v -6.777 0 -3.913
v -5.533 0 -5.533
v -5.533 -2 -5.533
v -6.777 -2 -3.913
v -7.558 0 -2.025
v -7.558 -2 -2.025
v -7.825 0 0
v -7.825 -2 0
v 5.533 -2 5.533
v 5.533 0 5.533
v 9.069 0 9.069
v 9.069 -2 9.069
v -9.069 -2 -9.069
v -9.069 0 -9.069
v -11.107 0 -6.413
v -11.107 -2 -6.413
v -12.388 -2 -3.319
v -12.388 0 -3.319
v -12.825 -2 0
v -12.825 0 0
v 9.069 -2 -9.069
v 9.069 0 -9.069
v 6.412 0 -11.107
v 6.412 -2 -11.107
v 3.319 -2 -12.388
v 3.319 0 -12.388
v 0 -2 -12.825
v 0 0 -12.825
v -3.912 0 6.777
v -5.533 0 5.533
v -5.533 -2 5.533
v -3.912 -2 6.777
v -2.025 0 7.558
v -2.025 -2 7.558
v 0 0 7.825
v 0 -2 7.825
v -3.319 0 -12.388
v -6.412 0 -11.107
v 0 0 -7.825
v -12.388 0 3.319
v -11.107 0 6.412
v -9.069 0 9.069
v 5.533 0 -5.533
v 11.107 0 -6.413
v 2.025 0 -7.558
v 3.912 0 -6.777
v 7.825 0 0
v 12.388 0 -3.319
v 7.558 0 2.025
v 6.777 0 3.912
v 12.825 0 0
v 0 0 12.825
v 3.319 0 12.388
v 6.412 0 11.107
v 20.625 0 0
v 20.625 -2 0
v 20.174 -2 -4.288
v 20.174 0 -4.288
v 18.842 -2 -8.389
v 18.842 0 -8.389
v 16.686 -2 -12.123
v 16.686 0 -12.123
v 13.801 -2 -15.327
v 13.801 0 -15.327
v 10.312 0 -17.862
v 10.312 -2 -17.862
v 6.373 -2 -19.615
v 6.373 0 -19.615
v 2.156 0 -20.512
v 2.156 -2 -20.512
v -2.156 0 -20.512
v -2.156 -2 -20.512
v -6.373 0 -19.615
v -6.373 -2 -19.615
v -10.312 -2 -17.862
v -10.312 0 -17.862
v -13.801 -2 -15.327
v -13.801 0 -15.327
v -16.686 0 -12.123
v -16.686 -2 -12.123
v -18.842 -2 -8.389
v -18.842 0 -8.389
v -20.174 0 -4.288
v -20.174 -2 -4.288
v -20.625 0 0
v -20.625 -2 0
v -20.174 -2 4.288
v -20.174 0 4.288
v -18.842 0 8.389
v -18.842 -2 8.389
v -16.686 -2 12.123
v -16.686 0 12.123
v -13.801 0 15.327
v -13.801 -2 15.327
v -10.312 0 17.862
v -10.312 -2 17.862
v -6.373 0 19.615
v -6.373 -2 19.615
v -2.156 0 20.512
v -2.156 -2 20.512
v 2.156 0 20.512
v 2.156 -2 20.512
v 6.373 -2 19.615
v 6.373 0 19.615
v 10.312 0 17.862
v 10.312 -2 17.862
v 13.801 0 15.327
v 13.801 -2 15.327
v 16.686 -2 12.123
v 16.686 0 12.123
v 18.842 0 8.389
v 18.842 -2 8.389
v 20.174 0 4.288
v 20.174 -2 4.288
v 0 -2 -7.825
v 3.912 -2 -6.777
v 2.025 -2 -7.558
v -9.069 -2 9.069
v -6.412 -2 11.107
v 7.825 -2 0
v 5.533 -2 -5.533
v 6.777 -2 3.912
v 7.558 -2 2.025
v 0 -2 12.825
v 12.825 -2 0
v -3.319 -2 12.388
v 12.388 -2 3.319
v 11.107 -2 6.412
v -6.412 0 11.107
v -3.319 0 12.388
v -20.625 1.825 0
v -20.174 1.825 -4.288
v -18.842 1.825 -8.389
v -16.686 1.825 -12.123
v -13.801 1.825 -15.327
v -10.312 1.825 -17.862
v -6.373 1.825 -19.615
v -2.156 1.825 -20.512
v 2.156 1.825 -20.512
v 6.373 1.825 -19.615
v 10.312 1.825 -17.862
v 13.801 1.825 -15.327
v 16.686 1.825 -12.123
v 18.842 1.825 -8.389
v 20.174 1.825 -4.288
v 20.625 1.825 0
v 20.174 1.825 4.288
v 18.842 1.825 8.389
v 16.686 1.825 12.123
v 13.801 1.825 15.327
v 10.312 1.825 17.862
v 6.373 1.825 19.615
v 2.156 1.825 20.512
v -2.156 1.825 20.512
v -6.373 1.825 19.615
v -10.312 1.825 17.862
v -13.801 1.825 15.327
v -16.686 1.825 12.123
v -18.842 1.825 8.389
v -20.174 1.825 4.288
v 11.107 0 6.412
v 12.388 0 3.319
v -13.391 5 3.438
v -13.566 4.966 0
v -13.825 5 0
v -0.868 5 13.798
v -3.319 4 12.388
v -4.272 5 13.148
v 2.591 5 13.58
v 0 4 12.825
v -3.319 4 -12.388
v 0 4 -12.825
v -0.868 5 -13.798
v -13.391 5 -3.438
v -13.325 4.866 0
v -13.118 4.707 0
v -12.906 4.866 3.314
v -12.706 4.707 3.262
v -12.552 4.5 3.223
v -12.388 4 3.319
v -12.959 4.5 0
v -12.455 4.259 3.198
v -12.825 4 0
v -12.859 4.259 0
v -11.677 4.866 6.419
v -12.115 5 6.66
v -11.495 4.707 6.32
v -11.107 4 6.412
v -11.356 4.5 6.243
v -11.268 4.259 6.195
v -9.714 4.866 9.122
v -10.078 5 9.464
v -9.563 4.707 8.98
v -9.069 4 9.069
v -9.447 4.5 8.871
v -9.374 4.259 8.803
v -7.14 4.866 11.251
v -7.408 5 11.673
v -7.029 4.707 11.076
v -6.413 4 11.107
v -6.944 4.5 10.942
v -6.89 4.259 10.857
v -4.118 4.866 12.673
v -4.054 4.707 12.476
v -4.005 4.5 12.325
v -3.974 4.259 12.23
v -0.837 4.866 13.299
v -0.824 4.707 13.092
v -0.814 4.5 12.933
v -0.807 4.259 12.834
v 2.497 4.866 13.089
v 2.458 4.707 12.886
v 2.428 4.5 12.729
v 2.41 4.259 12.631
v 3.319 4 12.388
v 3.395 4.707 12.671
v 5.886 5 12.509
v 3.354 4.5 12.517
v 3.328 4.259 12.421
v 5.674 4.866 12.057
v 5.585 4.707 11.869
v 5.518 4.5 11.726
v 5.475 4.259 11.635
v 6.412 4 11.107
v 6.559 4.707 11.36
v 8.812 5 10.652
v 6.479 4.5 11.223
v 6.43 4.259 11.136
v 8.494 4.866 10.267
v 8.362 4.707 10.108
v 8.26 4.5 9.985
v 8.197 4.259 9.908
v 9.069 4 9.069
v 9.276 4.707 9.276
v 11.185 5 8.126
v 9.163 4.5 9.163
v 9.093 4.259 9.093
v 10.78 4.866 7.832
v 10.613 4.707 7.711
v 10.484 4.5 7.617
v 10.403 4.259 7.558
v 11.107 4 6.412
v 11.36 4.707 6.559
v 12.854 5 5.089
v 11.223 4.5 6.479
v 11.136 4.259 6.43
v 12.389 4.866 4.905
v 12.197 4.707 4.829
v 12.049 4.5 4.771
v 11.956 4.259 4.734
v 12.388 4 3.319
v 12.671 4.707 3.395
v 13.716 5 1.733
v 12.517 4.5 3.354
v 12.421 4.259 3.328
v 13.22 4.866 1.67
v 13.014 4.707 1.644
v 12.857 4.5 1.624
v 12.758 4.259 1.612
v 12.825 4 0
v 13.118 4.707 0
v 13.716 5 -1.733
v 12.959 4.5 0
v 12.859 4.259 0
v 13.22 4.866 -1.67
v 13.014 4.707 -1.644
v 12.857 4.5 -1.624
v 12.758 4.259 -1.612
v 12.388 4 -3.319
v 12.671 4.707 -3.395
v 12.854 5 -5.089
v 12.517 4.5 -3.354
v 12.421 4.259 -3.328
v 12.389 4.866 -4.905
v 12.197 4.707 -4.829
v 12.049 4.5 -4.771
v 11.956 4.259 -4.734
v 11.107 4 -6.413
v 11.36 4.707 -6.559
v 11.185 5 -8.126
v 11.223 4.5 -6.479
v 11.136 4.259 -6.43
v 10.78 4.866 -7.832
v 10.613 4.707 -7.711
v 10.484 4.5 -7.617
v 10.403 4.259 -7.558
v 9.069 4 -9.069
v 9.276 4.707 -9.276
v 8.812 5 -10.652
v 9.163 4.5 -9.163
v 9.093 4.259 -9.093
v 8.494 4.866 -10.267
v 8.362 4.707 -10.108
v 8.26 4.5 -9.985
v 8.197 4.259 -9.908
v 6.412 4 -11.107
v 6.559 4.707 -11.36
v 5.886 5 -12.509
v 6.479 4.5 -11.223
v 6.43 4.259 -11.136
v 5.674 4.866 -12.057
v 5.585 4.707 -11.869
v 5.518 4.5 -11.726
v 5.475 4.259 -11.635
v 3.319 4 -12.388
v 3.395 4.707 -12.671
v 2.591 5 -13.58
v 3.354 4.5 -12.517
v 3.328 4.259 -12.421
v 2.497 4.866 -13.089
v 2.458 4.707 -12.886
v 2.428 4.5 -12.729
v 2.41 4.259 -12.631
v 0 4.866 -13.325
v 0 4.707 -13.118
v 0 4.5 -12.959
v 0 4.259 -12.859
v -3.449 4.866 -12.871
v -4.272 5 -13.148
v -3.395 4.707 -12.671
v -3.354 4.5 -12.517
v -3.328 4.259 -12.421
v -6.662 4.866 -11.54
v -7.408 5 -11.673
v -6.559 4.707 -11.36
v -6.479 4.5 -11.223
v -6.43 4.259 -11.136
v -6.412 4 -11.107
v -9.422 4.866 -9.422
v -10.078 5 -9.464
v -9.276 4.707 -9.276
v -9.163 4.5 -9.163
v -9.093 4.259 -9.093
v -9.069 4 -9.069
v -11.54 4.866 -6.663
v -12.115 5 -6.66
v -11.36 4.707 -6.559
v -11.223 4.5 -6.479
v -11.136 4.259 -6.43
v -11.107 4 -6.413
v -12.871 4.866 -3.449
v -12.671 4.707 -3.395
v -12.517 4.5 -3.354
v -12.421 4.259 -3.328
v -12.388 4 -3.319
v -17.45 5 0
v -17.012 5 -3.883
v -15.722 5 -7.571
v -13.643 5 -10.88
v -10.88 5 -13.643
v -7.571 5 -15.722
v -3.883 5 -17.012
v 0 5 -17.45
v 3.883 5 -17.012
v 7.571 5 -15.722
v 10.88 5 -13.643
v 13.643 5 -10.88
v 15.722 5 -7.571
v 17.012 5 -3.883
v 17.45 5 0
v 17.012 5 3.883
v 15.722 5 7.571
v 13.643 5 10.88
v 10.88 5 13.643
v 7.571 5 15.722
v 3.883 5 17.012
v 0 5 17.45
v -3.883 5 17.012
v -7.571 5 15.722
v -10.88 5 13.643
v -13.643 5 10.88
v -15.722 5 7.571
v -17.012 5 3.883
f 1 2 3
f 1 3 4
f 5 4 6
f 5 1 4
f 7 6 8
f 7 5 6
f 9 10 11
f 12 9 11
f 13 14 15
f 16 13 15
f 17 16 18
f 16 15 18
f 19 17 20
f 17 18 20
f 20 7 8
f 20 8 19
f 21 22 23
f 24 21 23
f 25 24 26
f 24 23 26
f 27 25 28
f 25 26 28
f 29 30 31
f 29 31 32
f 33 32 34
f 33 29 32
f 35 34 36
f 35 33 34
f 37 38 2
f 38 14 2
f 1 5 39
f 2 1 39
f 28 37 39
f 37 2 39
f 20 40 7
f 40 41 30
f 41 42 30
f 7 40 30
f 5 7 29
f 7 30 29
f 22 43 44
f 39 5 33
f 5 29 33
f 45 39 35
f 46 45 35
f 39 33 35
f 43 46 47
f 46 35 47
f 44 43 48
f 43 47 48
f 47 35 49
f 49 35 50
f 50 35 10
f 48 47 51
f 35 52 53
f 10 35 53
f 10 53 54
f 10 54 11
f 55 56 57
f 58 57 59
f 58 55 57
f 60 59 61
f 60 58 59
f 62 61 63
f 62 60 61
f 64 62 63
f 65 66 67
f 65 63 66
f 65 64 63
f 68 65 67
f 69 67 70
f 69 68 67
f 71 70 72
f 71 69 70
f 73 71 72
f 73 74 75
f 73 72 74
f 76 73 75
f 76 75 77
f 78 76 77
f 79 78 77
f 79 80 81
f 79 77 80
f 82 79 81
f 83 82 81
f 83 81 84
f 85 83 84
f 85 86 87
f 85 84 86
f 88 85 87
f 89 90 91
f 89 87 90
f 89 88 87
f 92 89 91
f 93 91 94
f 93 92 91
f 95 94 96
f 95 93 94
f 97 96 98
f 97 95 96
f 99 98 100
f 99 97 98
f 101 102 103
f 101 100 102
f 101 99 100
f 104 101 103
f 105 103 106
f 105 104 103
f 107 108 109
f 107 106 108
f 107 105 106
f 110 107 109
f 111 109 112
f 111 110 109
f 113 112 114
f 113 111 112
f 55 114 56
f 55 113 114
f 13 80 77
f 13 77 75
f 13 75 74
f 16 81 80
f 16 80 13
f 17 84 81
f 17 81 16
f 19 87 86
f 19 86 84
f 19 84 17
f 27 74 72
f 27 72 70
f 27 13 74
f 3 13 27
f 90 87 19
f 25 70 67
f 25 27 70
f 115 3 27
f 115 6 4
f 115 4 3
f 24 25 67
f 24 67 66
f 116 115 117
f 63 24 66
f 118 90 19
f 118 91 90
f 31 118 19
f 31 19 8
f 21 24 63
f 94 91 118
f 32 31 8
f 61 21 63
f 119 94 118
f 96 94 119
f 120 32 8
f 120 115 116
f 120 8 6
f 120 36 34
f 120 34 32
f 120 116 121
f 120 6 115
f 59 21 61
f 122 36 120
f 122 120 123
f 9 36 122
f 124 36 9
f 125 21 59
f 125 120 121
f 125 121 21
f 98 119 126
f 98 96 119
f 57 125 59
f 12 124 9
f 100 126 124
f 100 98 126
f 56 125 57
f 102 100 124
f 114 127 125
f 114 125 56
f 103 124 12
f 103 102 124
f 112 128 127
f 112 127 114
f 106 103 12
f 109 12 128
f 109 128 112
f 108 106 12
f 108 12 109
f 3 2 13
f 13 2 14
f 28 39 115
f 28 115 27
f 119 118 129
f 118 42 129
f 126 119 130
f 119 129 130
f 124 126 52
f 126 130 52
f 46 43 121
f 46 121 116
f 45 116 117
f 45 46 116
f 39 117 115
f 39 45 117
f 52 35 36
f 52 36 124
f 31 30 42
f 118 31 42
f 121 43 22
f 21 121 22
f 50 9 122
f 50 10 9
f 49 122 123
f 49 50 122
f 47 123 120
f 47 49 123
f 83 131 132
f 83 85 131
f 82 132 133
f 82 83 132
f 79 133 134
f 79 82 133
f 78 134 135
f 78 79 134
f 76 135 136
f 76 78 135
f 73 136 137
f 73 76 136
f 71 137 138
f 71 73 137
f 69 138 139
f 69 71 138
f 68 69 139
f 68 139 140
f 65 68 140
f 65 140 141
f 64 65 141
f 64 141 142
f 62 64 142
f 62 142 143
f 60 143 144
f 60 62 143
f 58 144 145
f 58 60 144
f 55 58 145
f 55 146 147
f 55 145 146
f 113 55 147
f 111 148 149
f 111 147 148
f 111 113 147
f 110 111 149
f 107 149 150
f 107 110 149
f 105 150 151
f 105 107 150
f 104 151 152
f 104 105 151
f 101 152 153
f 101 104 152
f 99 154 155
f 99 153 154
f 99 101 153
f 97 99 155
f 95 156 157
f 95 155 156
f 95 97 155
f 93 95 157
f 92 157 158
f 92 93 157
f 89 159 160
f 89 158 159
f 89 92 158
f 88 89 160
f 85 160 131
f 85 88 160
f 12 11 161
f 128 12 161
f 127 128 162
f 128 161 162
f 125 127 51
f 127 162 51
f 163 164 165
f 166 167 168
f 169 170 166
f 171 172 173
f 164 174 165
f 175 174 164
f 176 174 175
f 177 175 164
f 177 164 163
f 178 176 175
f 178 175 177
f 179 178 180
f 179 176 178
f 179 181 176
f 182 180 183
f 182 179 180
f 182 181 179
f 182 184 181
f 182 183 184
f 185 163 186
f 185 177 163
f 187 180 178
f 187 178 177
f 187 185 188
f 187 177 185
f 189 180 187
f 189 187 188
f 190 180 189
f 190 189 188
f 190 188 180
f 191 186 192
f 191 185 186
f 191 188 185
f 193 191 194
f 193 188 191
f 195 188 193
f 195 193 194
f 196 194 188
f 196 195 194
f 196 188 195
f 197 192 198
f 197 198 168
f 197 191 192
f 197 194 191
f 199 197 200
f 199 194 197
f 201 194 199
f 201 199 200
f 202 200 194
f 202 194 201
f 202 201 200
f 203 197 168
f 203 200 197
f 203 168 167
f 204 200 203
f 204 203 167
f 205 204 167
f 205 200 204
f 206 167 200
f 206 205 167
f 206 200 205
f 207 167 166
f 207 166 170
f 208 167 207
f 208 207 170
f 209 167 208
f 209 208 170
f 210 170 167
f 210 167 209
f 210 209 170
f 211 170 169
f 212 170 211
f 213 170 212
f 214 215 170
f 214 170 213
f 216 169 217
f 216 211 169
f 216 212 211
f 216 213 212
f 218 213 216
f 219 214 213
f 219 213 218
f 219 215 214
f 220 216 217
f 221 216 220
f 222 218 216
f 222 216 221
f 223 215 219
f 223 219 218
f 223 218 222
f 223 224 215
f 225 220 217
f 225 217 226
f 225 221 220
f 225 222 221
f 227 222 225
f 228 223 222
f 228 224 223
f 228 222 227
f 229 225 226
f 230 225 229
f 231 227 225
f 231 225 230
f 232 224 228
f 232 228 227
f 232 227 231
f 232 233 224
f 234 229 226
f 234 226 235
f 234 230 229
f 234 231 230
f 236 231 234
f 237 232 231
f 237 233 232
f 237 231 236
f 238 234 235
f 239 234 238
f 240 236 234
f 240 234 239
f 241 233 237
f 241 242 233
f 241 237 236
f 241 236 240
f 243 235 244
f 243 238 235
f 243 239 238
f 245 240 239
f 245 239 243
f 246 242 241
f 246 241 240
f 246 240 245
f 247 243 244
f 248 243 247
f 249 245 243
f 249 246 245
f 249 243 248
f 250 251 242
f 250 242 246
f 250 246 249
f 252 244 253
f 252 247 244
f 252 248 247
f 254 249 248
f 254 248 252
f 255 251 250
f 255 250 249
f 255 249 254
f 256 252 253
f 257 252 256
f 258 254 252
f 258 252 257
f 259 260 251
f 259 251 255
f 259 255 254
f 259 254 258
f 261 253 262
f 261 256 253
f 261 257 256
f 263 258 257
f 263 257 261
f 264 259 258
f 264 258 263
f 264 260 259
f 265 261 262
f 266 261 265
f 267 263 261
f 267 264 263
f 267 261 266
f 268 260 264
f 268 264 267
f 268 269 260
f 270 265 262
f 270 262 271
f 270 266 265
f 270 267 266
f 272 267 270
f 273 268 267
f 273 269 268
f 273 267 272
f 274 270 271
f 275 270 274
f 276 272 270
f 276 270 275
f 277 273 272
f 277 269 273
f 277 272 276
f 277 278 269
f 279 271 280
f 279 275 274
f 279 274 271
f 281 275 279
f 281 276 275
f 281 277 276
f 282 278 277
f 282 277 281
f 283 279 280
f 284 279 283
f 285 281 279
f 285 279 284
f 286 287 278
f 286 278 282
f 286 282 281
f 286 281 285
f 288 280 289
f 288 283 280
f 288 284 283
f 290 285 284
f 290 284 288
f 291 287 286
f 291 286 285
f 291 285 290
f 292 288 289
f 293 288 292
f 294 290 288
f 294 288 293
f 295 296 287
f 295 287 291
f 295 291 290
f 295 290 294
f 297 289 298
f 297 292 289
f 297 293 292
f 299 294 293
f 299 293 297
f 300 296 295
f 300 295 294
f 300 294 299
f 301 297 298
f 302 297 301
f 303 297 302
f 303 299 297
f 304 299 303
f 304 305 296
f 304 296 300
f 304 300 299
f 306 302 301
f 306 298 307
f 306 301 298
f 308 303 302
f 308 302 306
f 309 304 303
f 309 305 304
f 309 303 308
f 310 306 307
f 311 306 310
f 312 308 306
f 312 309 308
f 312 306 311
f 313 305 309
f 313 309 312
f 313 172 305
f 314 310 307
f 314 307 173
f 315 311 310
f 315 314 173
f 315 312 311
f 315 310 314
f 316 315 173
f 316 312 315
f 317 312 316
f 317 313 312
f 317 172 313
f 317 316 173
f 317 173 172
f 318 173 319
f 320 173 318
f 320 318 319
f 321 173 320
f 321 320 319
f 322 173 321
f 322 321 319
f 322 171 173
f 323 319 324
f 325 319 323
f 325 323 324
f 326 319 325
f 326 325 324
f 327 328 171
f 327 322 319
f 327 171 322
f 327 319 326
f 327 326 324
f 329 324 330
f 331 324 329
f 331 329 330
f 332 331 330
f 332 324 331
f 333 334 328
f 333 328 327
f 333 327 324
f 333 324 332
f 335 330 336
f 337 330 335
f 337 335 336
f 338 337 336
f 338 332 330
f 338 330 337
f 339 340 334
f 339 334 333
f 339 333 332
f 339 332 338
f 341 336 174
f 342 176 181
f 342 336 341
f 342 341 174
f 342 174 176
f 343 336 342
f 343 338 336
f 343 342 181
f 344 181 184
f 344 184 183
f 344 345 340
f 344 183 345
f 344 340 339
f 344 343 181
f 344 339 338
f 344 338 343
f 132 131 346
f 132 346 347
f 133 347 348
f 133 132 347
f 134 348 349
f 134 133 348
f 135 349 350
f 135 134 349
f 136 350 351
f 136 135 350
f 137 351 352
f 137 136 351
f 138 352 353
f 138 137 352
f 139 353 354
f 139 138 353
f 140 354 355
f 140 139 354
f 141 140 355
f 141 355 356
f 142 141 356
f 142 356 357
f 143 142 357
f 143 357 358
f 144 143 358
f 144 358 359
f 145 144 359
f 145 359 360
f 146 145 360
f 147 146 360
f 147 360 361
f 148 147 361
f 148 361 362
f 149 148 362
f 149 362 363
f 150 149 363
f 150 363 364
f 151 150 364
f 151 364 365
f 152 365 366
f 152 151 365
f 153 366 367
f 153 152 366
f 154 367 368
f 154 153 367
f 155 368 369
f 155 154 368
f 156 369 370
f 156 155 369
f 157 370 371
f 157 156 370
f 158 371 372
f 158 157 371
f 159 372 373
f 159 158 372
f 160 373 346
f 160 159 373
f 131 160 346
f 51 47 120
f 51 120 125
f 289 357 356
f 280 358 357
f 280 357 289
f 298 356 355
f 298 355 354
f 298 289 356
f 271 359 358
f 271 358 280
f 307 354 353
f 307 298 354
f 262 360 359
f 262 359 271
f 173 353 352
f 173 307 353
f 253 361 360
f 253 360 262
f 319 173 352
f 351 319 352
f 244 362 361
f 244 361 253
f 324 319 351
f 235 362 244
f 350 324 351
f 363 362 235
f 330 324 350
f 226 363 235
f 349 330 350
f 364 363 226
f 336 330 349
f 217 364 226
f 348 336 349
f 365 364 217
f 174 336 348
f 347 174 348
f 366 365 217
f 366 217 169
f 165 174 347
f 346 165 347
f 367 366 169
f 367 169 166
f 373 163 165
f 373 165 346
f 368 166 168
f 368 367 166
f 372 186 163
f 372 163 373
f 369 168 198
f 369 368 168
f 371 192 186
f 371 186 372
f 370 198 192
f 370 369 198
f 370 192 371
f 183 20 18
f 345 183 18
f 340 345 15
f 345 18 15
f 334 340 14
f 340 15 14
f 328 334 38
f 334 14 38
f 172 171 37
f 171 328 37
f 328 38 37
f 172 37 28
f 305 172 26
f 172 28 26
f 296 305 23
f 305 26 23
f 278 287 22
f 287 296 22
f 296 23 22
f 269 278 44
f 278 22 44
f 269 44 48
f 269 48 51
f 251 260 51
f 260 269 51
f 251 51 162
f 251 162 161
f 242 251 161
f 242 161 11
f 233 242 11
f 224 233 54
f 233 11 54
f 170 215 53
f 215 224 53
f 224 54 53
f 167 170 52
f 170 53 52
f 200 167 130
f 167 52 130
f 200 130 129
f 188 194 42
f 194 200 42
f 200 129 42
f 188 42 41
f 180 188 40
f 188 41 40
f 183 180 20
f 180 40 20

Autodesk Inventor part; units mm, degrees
ref_plane "YZ Plane" through (0, 0, 0) normal (1, 0, 0) x (0, 1, 0)
ref_plane "XZ Plane" through (0, 0, 0) normal (0, 1, 0) x (-1, 0, 0)
ref_plane "XY Plane" through (0, 0, 0) normal (0, 0, 1) x (1, 0, 0)
sketch "Sketch1" plane through (0, 0, 0) normal (0, 1, 0) x (-1, 0, 0)
  circle A0 centre (0, 0) radius 12.825
  circle A1 centre (0, 0) radius 7.9375
  circle A2 centre (0, 0) radius 7.825
  circle A3 centre (0, 0) radius 20.6248
  dimension "TubeDiameter" = 25.65
  dimension "RodDiameter" = 15.875
  dimension "RodGuardDiameter" = 15.65
  dimension "HiltGuardDiameter" = 41.2496
extrude "Tube&DowelMount" add sketch "Sketch1" along normal blind 5 contours A3
sketch "Sketch23" plane through (0, 0, 0) normal (0, -1, 0) x (1, 0, 0)
  circle A0 centre (0, 0) radius 20.6248
  line L0 (0, 0) -> (0, -20.6248)
  circle A1 centre (0, 0) radius 20.6248 projected
  circle A2 centre (0, 0) radius 7.825
  circle A3 centre (0, 0) radius 12.825
  line L1 (0, 0) -> (14.5839, -14.5839)
  line L2 (0, 0) -> (20.6248, 0)
  line L3 (0, 0) -> (14.5839, 14.5839)
  line L4 (0, 0) -> (0, 20.6248)
  line L5 (0, 0) -> (-14.5839, 14.5839)
  line L6 (0, 0) -> (-20.6248, 0)
  line L7 (0, 0) -> (-14.5839, -14.5839)
  point P0 (0, -12.825)
  point P1 (0, -7.825)
  point P2 (5.5331, -5.5331)
  point P3 (9.0686, -9.0686)
  point P4 (-9.0686, -9.0686)
  point P5 (-12.825, 0)
  point P6 (-7.825, 0)
  point P7 (-5.5331, -5.5331)
  point P8 (7.825, 0)
  point P9 (5.5331, 5.5331)
  point P10 (9.0686, 9.0686)
  point P11 (12.825, 0)
  point P12 (0, 7.825)
  point P13 (-5.5331, 5.5331)
  point P14 (-9.0686, 9.0686)
  point P15 (0, 12.825)
  dimension "d128" = 41.2496
  dimension "d129" = 15.65
  dimension "d130" = 25.65
  dimension "d133" = 360
extrude "WireHole" add sketch "Sketch23" along normal blind 2 contours L2 A3 L3 A0 | A0 L1 A3 L2 | L3 A3 L4 A0 | A0 L0 A3 L1 | A3 L1 A2 L2 | L4 A3 L5 A0 | L3 A2 L4 A3 | A0 L7 A3 L0 | L2 L3 A2 | A2 L1 L2 | L5 A3 L6 A0 | L3 L4 A2 | A0 L6 A3 L7 | A3 L7 A2 L0 | A2 L0 L1 | L5 A2 L4 | L6 A2 L5 | L7 A2 L6 | L0 A2 L7 | L5 A2 L6 A3
sketch "Sketch25" plane through (0, -2, 0) normal (0, -1, 0) x (1, 0, 0)
  circle A0 centre (0, 0) radius 12.825
  dimension "d138" = 25.65
chamfer "Chamfer4" distance 3.175 angle 45 1 edges at (20.6248, 5, 0)
fillet "Fillet2" radius 1 1 edges at (12.825, 5, 0)
equation "\"Clearance_1\" = 5"
properties part number "Dowel_Tube_Mount"
